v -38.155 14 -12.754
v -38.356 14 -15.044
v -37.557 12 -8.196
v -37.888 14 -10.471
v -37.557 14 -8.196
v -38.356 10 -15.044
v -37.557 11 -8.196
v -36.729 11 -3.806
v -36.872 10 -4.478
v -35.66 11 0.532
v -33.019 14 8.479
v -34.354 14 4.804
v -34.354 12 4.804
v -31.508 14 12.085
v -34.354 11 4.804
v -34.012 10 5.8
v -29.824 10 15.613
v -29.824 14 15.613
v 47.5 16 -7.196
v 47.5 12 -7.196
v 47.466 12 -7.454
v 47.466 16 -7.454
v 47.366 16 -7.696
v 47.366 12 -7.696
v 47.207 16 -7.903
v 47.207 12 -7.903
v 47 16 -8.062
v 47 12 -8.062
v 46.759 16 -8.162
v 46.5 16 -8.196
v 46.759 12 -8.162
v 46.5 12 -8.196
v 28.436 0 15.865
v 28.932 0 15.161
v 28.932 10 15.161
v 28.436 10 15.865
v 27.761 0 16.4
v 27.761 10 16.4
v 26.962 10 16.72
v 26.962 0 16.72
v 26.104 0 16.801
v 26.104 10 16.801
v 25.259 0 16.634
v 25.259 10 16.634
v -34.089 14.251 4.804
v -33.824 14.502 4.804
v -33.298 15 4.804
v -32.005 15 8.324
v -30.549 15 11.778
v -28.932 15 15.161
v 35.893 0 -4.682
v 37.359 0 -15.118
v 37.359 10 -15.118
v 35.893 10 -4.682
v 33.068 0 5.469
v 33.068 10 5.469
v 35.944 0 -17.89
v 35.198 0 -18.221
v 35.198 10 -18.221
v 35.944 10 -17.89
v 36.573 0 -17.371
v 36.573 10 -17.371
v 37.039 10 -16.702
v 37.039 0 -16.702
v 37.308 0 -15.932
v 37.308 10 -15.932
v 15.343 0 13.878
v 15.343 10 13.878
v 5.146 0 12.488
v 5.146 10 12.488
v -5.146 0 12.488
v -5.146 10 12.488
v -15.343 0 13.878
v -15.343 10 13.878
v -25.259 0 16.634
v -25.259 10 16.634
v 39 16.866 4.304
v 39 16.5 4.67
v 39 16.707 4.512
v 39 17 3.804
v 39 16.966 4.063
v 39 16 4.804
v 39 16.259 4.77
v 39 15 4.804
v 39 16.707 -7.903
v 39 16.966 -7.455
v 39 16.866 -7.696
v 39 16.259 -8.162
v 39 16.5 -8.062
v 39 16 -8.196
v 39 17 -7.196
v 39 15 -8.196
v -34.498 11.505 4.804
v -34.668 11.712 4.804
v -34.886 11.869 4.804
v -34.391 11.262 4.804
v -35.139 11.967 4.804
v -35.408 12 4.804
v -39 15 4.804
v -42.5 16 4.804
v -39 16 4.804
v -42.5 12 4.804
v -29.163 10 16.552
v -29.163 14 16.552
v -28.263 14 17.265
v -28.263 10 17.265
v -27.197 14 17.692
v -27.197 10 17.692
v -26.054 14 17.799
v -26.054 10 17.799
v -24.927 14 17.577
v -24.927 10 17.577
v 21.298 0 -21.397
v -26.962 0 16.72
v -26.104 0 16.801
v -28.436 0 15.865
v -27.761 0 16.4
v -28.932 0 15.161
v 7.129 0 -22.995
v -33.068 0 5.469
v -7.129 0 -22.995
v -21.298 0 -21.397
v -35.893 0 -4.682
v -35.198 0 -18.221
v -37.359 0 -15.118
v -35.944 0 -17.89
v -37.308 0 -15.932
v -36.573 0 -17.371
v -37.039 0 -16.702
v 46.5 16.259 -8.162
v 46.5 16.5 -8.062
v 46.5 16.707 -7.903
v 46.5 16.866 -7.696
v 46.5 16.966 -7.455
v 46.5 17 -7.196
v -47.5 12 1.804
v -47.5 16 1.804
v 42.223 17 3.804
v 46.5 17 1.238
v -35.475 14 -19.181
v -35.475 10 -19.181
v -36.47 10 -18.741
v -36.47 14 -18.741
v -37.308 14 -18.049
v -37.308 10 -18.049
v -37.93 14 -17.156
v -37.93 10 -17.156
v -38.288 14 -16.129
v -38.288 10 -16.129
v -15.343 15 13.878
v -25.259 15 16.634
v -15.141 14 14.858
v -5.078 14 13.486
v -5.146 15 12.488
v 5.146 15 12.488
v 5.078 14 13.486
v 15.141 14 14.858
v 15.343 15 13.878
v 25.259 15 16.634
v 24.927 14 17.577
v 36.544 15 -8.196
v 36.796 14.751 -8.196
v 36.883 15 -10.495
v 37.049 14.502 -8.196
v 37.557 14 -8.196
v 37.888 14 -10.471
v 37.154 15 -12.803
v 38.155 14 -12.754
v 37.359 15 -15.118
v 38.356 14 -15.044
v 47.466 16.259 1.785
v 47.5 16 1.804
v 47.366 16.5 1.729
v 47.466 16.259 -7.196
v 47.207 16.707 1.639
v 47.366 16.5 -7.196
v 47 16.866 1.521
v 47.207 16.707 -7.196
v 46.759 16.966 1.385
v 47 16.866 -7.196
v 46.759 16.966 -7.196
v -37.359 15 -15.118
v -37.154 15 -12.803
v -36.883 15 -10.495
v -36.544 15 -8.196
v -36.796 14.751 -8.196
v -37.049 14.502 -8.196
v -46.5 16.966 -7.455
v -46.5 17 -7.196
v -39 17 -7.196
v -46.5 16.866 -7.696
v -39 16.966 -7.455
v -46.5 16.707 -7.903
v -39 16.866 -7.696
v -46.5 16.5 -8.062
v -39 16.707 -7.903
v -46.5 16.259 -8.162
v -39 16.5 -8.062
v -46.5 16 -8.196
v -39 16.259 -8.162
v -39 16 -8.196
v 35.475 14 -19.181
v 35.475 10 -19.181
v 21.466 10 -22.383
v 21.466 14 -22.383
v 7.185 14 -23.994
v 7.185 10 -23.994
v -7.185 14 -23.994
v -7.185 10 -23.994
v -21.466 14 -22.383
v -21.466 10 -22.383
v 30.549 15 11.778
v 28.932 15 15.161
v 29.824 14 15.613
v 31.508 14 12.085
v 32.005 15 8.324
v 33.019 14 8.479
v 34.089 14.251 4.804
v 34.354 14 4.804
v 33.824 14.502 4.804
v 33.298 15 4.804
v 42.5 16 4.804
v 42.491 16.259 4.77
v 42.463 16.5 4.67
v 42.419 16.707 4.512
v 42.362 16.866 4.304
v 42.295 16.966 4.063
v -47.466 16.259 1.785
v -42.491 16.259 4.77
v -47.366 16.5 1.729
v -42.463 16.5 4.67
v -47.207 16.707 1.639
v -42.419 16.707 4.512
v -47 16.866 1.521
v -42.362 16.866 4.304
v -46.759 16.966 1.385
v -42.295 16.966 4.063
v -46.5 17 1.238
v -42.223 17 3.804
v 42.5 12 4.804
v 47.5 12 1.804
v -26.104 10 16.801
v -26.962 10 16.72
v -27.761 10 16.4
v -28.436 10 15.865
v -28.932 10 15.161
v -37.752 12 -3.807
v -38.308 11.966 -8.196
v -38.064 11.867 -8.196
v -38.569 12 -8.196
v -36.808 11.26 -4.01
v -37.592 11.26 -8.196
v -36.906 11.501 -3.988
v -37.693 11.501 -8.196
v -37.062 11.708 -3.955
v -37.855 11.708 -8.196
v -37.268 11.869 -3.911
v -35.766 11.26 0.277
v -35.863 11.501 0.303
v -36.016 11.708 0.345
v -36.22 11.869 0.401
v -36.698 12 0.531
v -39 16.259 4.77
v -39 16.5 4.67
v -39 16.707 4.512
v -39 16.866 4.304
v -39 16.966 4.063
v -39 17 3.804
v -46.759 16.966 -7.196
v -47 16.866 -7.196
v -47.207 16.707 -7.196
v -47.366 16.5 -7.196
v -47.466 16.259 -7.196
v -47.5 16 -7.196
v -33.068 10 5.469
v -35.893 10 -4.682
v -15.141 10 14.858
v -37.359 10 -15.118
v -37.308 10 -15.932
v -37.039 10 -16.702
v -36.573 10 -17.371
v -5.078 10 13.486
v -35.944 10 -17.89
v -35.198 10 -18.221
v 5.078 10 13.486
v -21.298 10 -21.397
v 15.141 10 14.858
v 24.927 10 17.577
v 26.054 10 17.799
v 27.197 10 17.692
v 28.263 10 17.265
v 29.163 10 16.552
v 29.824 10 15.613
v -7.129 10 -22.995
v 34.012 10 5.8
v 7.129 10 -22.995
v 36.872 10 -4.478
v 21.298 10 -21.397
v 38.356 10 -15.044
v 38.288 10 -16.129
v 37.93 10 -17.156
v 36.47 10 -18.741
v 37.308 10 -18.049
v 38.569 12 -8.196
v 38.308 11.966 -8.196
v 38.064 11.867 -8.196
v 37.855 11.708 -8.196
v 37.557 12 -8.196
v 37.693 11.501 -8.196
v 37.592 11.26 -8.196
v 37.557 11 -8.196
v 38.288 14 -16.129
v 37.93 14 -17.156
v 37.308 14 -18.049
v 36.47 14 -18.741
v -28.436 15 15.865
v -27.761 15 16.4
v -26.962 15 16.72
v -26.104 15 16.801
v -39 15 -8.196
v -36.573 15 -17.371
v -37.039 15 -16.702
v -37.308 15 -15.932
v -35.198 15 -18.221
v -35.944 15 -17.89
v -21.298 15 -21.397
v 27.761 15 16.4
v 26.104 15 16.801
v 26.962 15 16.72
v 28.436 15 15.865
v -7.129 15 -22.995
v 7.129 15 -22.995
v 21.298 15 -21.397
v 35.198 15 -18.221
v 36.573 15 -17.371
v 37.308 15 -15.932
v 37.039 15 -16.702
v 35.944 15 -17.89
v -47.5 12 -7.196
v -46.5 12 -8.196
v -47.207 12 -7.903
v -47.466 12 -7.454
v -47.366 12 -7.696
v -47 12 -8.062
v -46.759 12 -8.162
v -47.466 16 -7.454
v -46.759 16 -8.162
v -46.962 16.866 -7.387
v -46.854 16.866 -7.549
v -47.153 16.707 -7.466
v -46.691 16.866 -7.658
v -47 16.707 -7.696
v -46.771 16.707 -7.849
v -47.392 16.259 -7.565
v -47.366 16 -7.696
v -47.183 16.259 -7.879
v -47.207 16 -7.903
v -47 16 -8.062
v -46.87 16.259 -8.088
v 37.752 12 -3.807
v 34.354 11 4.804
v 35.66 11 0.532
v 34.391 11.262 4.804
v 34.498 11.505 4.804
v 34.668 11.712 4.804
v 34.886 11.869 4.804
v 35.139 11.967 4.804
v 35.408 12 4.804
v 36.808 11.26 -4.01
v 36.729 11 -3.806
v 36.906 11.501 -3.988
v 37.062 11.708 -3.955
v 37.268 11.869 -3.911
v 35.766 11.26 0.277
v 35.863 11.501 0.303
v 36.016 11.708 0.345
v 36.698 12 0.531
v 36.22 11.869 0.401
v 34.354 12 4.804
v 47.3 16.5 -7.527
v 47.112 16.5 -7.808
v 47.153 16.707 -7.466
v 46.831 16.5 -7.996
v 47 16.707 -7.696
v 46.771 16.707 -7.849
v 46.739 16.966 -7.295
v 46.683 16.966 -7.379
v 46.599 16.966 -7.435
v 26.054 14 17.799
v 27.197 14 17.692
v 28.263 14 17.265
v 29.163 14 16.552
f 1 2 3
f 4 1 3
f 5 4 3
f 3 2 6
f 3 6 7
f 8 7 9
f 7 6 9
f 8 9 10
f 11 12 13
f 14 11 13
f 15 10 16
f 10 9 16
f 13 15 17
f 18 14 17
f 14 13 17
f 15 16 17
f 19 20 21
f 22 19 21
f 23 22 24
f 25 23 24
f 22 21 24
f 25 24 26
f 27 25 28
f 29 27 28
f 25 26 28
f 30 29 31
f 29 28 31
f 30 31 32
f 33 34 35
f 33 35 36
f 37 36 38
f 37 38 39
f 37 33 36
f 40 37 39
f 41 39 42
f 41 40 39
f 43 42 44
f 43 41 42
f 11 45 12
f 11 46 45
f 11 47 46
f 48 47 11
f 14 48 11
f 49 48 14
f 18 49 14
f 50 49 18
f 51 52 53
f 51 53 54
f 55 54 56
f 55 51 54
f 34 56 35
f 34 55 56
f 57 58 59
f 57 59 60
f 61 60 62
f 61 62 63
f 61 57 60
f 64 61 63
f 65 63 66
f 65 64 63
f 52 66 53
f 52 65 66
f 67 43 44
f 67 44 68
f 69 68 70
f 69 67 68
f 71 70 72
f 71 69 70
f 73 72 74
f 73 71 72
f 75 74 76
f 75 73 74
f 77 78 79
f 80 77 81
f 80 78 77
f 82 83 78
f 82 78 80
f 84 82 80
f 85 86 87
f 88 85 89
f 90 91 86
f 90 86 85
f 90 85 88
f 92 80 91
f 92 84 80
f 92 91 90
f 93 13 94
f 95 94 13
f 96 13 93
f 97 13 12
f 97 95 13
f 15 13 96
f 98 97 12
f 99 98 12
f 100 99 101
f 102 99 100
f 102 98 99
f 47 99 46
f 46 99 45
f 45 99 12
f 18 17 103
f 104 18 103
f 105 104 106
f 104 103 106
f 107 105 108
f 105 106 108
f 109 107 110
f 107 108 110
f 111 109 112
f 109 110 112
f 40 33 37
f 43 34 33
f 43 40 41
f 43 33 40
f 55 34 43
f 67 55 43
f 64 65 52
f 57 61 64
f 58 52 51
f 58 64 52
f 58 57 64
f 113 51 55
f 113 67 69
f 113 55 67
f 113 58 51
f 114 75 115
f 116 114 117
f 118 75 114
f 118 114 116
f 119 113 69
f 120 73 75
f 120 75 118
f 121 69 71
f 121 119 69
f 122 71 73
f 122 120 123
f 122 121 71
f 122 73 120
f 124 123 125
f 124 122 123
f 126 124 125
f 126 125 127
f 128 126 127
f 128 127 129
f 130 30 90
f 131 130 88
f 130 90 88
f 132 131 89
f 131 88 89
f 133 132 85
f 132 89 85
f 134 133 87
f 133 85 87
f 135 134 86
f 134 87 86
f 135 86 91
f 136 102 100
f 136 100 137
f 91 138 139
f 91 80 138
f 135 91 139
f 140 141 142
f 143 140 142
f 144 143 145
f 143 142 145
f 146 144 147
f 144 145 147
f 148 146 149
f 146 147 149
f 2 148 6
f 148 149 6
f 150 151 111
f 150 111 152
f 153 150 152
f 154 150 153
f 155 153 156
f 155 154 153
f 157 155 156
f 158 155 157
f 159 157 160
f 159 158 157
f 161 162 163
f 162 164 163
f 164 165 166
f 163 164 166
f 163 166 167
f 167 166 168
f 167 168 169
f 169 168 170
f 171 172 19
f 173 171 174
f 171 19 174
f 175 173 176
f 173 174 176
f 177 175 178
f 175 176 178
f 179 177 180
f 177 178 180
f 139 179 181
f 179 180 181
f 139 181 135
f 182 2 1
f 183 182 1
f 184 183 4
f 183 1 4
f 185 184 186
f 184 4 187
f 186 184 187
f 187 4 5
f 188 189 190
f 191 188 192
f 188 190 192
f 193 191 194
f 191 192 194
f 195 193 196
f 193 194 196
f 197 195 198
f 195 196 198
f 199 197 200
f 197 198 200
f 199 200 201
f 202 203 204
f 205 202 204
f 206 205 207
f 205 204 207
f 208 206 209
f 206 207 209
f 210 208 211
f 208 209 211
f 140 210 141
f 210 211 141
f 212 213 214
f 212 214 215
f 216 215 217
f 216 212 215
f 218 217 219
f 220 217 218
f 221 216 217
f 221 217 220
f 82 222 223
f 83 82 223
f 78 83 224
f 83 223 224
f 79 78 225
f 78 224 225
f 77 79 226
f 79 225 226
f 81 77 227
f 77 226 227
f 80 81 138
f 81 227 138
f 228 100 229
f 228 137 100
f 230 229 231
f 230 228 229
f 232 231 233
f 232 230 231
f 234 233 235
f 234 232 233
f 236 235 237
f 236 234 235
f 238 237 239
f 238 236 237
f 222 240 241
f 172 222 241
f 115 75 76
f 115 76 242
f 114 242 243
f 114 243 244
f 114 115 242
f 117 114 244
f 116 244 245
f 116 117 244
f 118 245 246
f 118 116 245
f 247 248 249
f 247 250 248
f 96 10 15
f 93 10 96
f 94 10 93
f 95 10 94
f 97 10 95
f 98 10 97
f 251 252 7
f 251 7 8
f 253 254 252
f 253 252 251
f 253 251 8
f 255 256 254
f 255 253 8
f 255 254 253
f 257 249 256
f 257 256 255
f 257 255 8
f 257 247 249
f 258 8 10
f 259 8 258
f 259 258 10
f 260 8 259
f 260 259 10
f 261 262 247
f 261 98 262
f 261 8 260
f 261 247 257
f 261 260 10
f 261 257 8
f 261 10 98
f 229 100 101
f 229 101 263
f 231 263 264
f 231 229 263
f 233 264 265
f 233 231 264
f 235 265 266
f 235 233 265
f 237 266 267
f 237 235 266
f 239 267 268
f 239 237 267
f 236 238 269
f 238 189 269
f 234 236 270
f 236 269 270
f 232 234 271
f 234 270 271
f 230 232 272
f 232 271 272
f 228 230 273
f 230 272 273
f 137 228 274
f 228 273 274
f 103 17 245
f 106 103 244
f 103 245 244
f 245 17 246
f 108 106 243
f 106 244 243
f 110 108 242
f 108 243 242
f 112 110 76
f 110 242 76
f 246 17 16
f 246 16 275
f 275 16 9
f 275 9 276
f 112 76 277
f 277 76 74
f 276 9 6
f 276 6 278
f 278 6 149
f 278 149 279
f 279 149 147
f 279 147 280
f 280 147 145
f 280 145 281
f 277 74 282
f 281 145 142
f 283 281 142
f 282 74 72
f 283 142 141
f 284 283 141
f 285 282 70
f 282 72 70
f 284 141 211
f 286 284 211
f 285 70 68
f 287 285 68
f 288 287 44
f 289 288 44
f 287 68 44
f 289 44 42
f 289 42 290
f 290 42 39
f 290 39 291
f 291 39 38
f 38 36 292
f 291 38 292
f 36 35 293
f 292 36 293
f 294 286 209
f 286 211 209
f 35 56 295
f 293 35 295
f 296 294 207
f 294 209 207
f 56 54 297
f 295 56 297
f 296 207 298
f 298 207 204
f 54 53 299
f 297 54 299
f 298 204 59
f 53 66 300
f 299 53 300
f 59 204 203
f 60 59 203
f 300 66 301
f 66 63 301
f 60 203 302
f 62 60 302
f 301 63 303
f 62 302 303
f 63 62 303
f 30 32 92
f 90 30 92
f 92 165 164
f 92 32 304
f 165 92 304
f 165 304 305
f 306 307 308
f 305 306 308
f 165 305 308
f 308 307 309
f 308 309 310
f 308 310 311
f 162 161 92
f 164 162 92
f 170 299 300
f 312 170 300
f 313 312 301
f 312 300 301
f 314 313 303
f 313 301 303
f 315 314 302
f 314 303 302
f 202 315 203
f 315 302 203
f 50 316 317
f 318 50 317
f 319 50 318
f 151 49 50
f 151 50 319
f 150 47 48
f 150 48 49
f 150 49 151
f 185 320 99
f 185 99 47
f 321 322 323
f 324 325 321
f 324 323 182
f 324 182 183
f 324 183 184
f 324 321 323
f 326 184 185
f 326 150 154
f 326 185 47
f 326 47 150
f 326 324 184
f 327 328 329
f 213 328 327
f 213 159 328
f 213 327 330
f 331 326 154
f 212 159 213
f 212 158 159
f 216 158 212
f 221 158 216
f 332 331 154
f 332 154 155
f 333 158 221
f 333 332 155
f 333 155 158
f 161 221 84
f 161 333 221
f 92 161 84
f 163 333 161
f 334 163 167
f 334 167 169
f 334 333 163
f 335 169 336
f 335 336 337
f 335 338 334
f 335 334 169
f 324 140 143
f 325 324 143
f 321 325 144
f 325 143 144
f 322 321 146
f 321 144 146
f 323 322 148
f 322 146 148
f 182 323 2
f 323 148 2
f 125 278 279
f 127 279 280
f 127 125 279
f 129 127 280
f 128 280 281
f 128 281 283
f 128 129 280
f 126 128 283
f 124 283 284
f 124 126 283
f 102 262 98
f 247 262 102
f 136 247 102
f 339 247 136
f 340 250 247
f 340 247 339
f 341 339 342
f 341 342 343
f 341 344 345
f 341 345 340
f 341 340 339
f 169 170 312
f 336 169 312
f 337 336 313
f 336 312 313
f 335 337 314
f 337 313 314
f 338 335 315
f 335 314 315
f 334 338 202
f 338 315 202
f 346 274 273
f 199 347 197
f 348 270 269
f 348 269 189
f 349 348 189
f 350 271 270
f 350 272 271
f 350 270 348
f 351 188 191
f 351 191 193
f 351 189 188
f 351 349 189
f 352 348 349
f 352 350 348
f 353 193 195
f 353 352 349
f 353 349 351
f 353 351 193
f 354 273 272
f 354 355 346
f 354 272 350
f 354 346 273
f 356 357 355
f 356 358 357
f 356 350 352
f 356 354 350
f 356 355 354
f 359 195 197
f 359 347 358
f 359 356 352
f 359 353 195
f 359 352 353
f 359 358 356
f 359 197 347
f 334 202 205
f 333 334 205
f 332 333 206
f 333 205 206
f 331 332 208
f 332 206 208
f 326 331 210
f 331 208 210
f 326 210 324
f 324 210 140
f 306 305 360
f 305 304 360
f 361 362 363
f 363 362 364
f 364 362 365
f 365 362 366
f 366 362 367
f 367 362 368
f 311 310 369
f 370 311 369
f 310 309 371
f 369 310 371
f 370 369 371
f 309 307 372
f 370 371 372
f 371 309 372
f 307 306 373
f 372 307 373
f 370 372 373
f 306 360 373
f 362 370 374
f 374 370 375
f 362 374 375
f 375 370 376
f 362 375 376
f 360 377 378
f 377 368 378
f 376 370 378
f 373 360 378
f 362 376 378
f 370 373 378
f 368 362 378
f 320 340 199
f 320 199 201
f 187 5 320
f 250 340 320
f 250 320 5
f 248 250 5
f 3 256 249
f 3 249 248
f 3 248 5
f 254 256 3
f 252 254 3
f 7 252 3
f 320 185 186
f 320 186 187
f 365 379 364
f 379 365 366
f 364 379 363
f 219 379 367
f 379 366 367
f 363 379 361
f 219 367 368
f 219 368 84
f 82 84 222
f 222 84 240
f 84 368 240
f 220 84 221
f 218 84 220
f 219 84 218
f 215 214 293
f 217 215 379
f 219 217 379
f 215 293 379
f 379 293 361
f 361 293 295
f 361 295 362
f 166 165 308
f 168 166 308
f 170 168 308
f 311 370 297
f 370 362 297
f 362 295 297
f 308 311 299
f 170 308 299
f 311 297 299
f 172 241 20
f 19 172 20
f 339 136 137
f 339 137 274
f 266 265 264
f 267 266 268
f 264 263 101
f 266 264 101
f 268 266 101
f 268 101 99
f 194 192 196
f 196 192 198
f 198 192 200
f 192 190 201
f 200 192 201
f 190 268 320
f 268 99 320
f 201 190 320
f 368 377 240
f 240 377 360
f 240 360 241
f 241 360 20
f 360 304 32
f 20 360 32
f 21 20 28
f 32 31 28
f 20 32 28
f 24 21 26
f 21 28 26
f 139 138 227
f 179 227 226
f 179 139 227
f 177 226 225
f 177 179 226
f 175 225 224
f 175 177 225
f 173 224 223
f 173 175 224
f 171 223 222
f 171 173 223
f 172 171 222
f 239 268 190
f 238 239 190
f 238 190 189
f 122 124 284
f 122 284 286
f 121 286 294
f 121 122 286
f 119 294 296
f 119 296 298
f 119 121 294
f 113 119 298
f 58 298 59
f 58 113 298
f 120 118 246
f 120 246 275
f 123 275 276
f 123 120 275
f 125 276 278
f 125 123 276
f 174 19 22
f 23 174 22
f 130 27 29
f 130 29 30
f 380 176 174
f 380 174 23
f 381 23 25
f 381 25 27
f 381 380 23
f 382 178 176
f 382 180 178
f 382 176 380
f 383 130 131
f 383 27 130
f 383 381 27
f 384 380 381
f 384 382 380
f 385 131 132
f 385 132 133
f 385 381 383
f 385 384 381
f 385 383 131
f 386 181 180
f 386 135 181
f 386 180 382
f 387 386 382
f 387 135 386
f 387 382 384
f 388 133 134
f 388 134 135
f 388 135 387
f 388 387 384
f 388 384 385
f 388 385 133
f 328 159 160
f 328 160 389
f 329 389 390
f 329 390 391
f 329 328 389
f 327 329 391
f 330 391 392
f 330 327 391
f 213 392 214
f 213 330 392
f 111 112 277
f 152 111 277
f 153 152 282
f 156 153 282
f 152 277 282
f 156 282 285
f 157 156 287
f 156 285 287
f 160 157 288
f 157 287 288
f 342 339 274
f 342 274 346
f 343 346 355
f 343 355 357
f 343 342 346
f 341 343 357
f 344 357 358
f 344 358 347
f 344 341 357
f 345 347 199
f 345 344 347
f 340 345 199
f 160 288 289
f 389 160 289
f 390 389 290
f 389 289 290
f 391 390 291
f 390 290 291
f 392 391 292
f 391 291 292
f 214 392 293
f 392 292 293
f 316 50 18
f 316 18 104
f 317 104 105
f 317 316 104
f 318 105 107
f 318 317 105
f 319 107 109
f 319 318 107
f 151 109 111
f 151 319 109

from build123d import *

# Parameters (mm, degrees)
DODANIE_WYCI_GNI_CIE2_DEPTH      = 10
DODANIE_WYCI_GNI_CIE3_DEPTH      = 5
DODANIE_WYCI_GNI_CIE4_DEPTH      = 2
DODANIE_WYCI_GNI_CIE4_DEPTH_BACK = 3
SFAZOWANIE2_SIZE                 = 1
ZAOKR_GLENIE2_R                  = 1
SZKIC5_W                         = 78
SZKIC5_H                         = 47.399243566
WYTNIJ_WYCI_GNI_CIE1_DEPTH       = 10


with BuildPart() as part:
    # Szkic1 → Dodanie-wyciągnięcie2 (new body)
    with BuildSketch(Plane(origin=(0, 0, 0), x_dir=(1, 0, 0), z_dir=(0, 1, 0))):
        with BuildLine():
            ThreePointArc((-35.198290521, 18.220532858), (0, 23.195615958), (35.198290521, 18.220532858))
            ThreePointArc((35.198290521, 18.220532858), (36.828860435, 17.052239434), (37.358722234, 15.117578161))
            ThreePointArc((37.358722234, 15.117578161), (34.64818175, -0.440013395), (28.93215854, -15.161180582))
            ThreePointArc((28.93215854, -15.161180582), (27.37301165, -16.588880533), (25.259425897, -16.633840931))
            ThreePointArc((25.259425897, -16.633840931), (0, -12.31341545), (-25.259425897, -16.633840931))
            ThreePointArc((-25.259425897, -16.633840931), (-27.37301165, -16.588880533), (-28.93215854, -15.161180582))
            ThreePointArc((-28.93215854, -15.161180582), (-34.64818175, -0.440013395), (-37.358722234, 15.117578161))
            ThreePointArc((-37.358722234, 15.117578161), (-36.828860435, 17.052239434), (-35.198290521, 18.220532858))
        make_face()
    extrude(amount=DODANIE_WYCI_GNI_CIE2_DEPTH)

    # Szkic3 → Dodanie-wyciągnięcie3 (add)
    with BuildSketch(Plane(origin=(0, 10, 0), x_dir=(1, 0, 0), z_dir=(0, 1, 0))):
        with BuildLine():
            ThreePointArc((-35.475442415, 19.181358975), (-37.649535634, 17.62363441), (-38.356018032, 15.044086045))
            ThreePointArc((-38.356018032, 15.044086045), (-35.611569929, -0.708123852), (-29.824041887, -15.613446096))
            ThreePointArc((-29.824041887, -15.613446096), (-27.745179368, -17.51704603), (-24.92706503, -17.576993227))
            ThreePointArc((-24.92706503, -17.576993227), (0, -13.31341545), (24.92706503, -17.576993227))
            ThreePointArc((24.92706503, -17.576993227), (27.745179368, -17.51704603), (29.824041887, -15.613446096))
            ThreePointArc((29.824041887, -15.613446096), (35.611569929, -0.708123852), (38.356018032, 15.044086045))
            ThreePointArc((38.356018032, 15.044086045), (37.649535634, 17.62363441), (35.475442415, 19.181358975))
            ThreePointArc((35.475442415, 19.181358975), (0, 24.195615958), (-35.475442415, 19.181358975))
        make_face()
    extrude(amount=DODANIE_WYCI_GNI_CIE3_DEPTH)

    # Szkic4 → Dodanie-wyciągnięcie4 (add, two sides: drawn at the far end of the back side and taken through both)
    with BuildSketch(Plane(origin=(0, 15, 0), x_dir=(1, 0, 0), z_dir=(0, 1, 0)).offset(-DODANIE_WYCI_GNI_CIE4_DEPTH_BACK)):
        with BuildLine():
            Line((-34.353845871, -4.804384042), (-38.327790803, -4.804384042))
            Line((-38.327790803, -4.804384042), (-42.5, -4.804384042))
            Line((-42.5, -4.804384042), (-47.5, -1.804384042))
            Line((-47.5, -1.804384042), (-47.5, 7.195615958))
            ThreePointArc((-47.5, 7.195615958), (-47.207106781, 7.90272274), (-46.5, 8.195615958))
            Line((-46.5, 8.195615958), (-37.556869269, 8.195615958))
            ThreePointArc((-37.556869269, 8.195615958), (-36.224623376, 1.629272522), (-34.353845871, -4.804384042))
        make_face()
        with BuildLine():
            Line((42.5, -4.804384042), (47.5, -1.804384042))
            Line((47.5, -1.804384042), (47.5, 7.195615958))
            ThreePointArc((47.5, 7.195615958), (47.207106781, 7.90272274), (46.5, 8.195615958))
            Line((46.5, 8.195615958), (37.556869269, 8.195615958))
            ThreePointArc((37.556869269, 8.195615958), (36.224623376, 1.629272522), (34.353845871, -4.804384042))
            Line((34.353845871, -4.804384042), (38.327790803, -4.804384042))
            Line((38.327790803, -4.804384042), (42.5, -4.804384042))
        make_face()
    extrude(amount=DODANIE_WYCI_GNI_CIE4_DEPTH + DODANIE_WYCI_GNI_CIE4_DEPTH_BACK)

    # Sfazowanie2
    sfazowanie2_edges = [part.edges().sort_by_distance(p)[0] for p in [
        (0, 15, -24.195615958),
        (-37.649535634, 15, -17.62363441),
        (-38.029401728, 15, -11.611337515),
        (-27.745179368, 15, 17.51704603),
        (0, 15, 13.31341545),
        (27.745179368, 15, 17.51704603),
        (32.284843088, 15, 10.291011463),
        (37.649535634, 15, -17.62363441),
        (38.029401728, 15, -11.611337515),
        (-32.284843088, 15, 10.291011463),
    ]]
    chamfer(sfazowanie2_edges, length=SFAZOWANIE2_SIZE)

    # Zaokrąglenie2
    zaokr_glenie2_edges = [part.edges().sort_by_distance(p)[0] for p in [
        (-36.224623376, 12, -1.629272522),
        (-36.224623376, 15, -1.629272522),
        (-38.426922936, 17, 4.804384042),
        (-45, 17, 3.304384042),
        (-47.5, 17, -2.695615958),
        (-42.028434635, 17, -8.195615958),
        (42.028434635, 17, -8.195615958),
        (47.5, 17, -2.695615958),
        (45, 17, 3.304384042),
        (38.426922936, 17, 4.804384042),
        (36.224623376, 12, -1.629272522),
        (36.224623376, 15, -1.629272522),
        (36.224623376, 17, -1.629272522),
    ]]
    fillet(zaokr_glenie2_edges, radius=ZAOKR_GLENIE2_R - 0.0001)  # a hair under: the kernel refuses the full size

    # Szkic5 → Wytnij-wyciągnięcie1 (cut)
    with BuildSketch(Plane(origin=(0, 15, 0), x_dir=(1, 0, 0), z_dir=(0, 1, 0))):
        with Locations((0, -5.950048289)):
            Rectangle(SZKIC5_W, SZKIC5_H)
    extrude(amount=WYTNIJ_WYCI_GNI_CIE1_DEPTH, mode=Mode.SUBTRACT)


solid = part.part
